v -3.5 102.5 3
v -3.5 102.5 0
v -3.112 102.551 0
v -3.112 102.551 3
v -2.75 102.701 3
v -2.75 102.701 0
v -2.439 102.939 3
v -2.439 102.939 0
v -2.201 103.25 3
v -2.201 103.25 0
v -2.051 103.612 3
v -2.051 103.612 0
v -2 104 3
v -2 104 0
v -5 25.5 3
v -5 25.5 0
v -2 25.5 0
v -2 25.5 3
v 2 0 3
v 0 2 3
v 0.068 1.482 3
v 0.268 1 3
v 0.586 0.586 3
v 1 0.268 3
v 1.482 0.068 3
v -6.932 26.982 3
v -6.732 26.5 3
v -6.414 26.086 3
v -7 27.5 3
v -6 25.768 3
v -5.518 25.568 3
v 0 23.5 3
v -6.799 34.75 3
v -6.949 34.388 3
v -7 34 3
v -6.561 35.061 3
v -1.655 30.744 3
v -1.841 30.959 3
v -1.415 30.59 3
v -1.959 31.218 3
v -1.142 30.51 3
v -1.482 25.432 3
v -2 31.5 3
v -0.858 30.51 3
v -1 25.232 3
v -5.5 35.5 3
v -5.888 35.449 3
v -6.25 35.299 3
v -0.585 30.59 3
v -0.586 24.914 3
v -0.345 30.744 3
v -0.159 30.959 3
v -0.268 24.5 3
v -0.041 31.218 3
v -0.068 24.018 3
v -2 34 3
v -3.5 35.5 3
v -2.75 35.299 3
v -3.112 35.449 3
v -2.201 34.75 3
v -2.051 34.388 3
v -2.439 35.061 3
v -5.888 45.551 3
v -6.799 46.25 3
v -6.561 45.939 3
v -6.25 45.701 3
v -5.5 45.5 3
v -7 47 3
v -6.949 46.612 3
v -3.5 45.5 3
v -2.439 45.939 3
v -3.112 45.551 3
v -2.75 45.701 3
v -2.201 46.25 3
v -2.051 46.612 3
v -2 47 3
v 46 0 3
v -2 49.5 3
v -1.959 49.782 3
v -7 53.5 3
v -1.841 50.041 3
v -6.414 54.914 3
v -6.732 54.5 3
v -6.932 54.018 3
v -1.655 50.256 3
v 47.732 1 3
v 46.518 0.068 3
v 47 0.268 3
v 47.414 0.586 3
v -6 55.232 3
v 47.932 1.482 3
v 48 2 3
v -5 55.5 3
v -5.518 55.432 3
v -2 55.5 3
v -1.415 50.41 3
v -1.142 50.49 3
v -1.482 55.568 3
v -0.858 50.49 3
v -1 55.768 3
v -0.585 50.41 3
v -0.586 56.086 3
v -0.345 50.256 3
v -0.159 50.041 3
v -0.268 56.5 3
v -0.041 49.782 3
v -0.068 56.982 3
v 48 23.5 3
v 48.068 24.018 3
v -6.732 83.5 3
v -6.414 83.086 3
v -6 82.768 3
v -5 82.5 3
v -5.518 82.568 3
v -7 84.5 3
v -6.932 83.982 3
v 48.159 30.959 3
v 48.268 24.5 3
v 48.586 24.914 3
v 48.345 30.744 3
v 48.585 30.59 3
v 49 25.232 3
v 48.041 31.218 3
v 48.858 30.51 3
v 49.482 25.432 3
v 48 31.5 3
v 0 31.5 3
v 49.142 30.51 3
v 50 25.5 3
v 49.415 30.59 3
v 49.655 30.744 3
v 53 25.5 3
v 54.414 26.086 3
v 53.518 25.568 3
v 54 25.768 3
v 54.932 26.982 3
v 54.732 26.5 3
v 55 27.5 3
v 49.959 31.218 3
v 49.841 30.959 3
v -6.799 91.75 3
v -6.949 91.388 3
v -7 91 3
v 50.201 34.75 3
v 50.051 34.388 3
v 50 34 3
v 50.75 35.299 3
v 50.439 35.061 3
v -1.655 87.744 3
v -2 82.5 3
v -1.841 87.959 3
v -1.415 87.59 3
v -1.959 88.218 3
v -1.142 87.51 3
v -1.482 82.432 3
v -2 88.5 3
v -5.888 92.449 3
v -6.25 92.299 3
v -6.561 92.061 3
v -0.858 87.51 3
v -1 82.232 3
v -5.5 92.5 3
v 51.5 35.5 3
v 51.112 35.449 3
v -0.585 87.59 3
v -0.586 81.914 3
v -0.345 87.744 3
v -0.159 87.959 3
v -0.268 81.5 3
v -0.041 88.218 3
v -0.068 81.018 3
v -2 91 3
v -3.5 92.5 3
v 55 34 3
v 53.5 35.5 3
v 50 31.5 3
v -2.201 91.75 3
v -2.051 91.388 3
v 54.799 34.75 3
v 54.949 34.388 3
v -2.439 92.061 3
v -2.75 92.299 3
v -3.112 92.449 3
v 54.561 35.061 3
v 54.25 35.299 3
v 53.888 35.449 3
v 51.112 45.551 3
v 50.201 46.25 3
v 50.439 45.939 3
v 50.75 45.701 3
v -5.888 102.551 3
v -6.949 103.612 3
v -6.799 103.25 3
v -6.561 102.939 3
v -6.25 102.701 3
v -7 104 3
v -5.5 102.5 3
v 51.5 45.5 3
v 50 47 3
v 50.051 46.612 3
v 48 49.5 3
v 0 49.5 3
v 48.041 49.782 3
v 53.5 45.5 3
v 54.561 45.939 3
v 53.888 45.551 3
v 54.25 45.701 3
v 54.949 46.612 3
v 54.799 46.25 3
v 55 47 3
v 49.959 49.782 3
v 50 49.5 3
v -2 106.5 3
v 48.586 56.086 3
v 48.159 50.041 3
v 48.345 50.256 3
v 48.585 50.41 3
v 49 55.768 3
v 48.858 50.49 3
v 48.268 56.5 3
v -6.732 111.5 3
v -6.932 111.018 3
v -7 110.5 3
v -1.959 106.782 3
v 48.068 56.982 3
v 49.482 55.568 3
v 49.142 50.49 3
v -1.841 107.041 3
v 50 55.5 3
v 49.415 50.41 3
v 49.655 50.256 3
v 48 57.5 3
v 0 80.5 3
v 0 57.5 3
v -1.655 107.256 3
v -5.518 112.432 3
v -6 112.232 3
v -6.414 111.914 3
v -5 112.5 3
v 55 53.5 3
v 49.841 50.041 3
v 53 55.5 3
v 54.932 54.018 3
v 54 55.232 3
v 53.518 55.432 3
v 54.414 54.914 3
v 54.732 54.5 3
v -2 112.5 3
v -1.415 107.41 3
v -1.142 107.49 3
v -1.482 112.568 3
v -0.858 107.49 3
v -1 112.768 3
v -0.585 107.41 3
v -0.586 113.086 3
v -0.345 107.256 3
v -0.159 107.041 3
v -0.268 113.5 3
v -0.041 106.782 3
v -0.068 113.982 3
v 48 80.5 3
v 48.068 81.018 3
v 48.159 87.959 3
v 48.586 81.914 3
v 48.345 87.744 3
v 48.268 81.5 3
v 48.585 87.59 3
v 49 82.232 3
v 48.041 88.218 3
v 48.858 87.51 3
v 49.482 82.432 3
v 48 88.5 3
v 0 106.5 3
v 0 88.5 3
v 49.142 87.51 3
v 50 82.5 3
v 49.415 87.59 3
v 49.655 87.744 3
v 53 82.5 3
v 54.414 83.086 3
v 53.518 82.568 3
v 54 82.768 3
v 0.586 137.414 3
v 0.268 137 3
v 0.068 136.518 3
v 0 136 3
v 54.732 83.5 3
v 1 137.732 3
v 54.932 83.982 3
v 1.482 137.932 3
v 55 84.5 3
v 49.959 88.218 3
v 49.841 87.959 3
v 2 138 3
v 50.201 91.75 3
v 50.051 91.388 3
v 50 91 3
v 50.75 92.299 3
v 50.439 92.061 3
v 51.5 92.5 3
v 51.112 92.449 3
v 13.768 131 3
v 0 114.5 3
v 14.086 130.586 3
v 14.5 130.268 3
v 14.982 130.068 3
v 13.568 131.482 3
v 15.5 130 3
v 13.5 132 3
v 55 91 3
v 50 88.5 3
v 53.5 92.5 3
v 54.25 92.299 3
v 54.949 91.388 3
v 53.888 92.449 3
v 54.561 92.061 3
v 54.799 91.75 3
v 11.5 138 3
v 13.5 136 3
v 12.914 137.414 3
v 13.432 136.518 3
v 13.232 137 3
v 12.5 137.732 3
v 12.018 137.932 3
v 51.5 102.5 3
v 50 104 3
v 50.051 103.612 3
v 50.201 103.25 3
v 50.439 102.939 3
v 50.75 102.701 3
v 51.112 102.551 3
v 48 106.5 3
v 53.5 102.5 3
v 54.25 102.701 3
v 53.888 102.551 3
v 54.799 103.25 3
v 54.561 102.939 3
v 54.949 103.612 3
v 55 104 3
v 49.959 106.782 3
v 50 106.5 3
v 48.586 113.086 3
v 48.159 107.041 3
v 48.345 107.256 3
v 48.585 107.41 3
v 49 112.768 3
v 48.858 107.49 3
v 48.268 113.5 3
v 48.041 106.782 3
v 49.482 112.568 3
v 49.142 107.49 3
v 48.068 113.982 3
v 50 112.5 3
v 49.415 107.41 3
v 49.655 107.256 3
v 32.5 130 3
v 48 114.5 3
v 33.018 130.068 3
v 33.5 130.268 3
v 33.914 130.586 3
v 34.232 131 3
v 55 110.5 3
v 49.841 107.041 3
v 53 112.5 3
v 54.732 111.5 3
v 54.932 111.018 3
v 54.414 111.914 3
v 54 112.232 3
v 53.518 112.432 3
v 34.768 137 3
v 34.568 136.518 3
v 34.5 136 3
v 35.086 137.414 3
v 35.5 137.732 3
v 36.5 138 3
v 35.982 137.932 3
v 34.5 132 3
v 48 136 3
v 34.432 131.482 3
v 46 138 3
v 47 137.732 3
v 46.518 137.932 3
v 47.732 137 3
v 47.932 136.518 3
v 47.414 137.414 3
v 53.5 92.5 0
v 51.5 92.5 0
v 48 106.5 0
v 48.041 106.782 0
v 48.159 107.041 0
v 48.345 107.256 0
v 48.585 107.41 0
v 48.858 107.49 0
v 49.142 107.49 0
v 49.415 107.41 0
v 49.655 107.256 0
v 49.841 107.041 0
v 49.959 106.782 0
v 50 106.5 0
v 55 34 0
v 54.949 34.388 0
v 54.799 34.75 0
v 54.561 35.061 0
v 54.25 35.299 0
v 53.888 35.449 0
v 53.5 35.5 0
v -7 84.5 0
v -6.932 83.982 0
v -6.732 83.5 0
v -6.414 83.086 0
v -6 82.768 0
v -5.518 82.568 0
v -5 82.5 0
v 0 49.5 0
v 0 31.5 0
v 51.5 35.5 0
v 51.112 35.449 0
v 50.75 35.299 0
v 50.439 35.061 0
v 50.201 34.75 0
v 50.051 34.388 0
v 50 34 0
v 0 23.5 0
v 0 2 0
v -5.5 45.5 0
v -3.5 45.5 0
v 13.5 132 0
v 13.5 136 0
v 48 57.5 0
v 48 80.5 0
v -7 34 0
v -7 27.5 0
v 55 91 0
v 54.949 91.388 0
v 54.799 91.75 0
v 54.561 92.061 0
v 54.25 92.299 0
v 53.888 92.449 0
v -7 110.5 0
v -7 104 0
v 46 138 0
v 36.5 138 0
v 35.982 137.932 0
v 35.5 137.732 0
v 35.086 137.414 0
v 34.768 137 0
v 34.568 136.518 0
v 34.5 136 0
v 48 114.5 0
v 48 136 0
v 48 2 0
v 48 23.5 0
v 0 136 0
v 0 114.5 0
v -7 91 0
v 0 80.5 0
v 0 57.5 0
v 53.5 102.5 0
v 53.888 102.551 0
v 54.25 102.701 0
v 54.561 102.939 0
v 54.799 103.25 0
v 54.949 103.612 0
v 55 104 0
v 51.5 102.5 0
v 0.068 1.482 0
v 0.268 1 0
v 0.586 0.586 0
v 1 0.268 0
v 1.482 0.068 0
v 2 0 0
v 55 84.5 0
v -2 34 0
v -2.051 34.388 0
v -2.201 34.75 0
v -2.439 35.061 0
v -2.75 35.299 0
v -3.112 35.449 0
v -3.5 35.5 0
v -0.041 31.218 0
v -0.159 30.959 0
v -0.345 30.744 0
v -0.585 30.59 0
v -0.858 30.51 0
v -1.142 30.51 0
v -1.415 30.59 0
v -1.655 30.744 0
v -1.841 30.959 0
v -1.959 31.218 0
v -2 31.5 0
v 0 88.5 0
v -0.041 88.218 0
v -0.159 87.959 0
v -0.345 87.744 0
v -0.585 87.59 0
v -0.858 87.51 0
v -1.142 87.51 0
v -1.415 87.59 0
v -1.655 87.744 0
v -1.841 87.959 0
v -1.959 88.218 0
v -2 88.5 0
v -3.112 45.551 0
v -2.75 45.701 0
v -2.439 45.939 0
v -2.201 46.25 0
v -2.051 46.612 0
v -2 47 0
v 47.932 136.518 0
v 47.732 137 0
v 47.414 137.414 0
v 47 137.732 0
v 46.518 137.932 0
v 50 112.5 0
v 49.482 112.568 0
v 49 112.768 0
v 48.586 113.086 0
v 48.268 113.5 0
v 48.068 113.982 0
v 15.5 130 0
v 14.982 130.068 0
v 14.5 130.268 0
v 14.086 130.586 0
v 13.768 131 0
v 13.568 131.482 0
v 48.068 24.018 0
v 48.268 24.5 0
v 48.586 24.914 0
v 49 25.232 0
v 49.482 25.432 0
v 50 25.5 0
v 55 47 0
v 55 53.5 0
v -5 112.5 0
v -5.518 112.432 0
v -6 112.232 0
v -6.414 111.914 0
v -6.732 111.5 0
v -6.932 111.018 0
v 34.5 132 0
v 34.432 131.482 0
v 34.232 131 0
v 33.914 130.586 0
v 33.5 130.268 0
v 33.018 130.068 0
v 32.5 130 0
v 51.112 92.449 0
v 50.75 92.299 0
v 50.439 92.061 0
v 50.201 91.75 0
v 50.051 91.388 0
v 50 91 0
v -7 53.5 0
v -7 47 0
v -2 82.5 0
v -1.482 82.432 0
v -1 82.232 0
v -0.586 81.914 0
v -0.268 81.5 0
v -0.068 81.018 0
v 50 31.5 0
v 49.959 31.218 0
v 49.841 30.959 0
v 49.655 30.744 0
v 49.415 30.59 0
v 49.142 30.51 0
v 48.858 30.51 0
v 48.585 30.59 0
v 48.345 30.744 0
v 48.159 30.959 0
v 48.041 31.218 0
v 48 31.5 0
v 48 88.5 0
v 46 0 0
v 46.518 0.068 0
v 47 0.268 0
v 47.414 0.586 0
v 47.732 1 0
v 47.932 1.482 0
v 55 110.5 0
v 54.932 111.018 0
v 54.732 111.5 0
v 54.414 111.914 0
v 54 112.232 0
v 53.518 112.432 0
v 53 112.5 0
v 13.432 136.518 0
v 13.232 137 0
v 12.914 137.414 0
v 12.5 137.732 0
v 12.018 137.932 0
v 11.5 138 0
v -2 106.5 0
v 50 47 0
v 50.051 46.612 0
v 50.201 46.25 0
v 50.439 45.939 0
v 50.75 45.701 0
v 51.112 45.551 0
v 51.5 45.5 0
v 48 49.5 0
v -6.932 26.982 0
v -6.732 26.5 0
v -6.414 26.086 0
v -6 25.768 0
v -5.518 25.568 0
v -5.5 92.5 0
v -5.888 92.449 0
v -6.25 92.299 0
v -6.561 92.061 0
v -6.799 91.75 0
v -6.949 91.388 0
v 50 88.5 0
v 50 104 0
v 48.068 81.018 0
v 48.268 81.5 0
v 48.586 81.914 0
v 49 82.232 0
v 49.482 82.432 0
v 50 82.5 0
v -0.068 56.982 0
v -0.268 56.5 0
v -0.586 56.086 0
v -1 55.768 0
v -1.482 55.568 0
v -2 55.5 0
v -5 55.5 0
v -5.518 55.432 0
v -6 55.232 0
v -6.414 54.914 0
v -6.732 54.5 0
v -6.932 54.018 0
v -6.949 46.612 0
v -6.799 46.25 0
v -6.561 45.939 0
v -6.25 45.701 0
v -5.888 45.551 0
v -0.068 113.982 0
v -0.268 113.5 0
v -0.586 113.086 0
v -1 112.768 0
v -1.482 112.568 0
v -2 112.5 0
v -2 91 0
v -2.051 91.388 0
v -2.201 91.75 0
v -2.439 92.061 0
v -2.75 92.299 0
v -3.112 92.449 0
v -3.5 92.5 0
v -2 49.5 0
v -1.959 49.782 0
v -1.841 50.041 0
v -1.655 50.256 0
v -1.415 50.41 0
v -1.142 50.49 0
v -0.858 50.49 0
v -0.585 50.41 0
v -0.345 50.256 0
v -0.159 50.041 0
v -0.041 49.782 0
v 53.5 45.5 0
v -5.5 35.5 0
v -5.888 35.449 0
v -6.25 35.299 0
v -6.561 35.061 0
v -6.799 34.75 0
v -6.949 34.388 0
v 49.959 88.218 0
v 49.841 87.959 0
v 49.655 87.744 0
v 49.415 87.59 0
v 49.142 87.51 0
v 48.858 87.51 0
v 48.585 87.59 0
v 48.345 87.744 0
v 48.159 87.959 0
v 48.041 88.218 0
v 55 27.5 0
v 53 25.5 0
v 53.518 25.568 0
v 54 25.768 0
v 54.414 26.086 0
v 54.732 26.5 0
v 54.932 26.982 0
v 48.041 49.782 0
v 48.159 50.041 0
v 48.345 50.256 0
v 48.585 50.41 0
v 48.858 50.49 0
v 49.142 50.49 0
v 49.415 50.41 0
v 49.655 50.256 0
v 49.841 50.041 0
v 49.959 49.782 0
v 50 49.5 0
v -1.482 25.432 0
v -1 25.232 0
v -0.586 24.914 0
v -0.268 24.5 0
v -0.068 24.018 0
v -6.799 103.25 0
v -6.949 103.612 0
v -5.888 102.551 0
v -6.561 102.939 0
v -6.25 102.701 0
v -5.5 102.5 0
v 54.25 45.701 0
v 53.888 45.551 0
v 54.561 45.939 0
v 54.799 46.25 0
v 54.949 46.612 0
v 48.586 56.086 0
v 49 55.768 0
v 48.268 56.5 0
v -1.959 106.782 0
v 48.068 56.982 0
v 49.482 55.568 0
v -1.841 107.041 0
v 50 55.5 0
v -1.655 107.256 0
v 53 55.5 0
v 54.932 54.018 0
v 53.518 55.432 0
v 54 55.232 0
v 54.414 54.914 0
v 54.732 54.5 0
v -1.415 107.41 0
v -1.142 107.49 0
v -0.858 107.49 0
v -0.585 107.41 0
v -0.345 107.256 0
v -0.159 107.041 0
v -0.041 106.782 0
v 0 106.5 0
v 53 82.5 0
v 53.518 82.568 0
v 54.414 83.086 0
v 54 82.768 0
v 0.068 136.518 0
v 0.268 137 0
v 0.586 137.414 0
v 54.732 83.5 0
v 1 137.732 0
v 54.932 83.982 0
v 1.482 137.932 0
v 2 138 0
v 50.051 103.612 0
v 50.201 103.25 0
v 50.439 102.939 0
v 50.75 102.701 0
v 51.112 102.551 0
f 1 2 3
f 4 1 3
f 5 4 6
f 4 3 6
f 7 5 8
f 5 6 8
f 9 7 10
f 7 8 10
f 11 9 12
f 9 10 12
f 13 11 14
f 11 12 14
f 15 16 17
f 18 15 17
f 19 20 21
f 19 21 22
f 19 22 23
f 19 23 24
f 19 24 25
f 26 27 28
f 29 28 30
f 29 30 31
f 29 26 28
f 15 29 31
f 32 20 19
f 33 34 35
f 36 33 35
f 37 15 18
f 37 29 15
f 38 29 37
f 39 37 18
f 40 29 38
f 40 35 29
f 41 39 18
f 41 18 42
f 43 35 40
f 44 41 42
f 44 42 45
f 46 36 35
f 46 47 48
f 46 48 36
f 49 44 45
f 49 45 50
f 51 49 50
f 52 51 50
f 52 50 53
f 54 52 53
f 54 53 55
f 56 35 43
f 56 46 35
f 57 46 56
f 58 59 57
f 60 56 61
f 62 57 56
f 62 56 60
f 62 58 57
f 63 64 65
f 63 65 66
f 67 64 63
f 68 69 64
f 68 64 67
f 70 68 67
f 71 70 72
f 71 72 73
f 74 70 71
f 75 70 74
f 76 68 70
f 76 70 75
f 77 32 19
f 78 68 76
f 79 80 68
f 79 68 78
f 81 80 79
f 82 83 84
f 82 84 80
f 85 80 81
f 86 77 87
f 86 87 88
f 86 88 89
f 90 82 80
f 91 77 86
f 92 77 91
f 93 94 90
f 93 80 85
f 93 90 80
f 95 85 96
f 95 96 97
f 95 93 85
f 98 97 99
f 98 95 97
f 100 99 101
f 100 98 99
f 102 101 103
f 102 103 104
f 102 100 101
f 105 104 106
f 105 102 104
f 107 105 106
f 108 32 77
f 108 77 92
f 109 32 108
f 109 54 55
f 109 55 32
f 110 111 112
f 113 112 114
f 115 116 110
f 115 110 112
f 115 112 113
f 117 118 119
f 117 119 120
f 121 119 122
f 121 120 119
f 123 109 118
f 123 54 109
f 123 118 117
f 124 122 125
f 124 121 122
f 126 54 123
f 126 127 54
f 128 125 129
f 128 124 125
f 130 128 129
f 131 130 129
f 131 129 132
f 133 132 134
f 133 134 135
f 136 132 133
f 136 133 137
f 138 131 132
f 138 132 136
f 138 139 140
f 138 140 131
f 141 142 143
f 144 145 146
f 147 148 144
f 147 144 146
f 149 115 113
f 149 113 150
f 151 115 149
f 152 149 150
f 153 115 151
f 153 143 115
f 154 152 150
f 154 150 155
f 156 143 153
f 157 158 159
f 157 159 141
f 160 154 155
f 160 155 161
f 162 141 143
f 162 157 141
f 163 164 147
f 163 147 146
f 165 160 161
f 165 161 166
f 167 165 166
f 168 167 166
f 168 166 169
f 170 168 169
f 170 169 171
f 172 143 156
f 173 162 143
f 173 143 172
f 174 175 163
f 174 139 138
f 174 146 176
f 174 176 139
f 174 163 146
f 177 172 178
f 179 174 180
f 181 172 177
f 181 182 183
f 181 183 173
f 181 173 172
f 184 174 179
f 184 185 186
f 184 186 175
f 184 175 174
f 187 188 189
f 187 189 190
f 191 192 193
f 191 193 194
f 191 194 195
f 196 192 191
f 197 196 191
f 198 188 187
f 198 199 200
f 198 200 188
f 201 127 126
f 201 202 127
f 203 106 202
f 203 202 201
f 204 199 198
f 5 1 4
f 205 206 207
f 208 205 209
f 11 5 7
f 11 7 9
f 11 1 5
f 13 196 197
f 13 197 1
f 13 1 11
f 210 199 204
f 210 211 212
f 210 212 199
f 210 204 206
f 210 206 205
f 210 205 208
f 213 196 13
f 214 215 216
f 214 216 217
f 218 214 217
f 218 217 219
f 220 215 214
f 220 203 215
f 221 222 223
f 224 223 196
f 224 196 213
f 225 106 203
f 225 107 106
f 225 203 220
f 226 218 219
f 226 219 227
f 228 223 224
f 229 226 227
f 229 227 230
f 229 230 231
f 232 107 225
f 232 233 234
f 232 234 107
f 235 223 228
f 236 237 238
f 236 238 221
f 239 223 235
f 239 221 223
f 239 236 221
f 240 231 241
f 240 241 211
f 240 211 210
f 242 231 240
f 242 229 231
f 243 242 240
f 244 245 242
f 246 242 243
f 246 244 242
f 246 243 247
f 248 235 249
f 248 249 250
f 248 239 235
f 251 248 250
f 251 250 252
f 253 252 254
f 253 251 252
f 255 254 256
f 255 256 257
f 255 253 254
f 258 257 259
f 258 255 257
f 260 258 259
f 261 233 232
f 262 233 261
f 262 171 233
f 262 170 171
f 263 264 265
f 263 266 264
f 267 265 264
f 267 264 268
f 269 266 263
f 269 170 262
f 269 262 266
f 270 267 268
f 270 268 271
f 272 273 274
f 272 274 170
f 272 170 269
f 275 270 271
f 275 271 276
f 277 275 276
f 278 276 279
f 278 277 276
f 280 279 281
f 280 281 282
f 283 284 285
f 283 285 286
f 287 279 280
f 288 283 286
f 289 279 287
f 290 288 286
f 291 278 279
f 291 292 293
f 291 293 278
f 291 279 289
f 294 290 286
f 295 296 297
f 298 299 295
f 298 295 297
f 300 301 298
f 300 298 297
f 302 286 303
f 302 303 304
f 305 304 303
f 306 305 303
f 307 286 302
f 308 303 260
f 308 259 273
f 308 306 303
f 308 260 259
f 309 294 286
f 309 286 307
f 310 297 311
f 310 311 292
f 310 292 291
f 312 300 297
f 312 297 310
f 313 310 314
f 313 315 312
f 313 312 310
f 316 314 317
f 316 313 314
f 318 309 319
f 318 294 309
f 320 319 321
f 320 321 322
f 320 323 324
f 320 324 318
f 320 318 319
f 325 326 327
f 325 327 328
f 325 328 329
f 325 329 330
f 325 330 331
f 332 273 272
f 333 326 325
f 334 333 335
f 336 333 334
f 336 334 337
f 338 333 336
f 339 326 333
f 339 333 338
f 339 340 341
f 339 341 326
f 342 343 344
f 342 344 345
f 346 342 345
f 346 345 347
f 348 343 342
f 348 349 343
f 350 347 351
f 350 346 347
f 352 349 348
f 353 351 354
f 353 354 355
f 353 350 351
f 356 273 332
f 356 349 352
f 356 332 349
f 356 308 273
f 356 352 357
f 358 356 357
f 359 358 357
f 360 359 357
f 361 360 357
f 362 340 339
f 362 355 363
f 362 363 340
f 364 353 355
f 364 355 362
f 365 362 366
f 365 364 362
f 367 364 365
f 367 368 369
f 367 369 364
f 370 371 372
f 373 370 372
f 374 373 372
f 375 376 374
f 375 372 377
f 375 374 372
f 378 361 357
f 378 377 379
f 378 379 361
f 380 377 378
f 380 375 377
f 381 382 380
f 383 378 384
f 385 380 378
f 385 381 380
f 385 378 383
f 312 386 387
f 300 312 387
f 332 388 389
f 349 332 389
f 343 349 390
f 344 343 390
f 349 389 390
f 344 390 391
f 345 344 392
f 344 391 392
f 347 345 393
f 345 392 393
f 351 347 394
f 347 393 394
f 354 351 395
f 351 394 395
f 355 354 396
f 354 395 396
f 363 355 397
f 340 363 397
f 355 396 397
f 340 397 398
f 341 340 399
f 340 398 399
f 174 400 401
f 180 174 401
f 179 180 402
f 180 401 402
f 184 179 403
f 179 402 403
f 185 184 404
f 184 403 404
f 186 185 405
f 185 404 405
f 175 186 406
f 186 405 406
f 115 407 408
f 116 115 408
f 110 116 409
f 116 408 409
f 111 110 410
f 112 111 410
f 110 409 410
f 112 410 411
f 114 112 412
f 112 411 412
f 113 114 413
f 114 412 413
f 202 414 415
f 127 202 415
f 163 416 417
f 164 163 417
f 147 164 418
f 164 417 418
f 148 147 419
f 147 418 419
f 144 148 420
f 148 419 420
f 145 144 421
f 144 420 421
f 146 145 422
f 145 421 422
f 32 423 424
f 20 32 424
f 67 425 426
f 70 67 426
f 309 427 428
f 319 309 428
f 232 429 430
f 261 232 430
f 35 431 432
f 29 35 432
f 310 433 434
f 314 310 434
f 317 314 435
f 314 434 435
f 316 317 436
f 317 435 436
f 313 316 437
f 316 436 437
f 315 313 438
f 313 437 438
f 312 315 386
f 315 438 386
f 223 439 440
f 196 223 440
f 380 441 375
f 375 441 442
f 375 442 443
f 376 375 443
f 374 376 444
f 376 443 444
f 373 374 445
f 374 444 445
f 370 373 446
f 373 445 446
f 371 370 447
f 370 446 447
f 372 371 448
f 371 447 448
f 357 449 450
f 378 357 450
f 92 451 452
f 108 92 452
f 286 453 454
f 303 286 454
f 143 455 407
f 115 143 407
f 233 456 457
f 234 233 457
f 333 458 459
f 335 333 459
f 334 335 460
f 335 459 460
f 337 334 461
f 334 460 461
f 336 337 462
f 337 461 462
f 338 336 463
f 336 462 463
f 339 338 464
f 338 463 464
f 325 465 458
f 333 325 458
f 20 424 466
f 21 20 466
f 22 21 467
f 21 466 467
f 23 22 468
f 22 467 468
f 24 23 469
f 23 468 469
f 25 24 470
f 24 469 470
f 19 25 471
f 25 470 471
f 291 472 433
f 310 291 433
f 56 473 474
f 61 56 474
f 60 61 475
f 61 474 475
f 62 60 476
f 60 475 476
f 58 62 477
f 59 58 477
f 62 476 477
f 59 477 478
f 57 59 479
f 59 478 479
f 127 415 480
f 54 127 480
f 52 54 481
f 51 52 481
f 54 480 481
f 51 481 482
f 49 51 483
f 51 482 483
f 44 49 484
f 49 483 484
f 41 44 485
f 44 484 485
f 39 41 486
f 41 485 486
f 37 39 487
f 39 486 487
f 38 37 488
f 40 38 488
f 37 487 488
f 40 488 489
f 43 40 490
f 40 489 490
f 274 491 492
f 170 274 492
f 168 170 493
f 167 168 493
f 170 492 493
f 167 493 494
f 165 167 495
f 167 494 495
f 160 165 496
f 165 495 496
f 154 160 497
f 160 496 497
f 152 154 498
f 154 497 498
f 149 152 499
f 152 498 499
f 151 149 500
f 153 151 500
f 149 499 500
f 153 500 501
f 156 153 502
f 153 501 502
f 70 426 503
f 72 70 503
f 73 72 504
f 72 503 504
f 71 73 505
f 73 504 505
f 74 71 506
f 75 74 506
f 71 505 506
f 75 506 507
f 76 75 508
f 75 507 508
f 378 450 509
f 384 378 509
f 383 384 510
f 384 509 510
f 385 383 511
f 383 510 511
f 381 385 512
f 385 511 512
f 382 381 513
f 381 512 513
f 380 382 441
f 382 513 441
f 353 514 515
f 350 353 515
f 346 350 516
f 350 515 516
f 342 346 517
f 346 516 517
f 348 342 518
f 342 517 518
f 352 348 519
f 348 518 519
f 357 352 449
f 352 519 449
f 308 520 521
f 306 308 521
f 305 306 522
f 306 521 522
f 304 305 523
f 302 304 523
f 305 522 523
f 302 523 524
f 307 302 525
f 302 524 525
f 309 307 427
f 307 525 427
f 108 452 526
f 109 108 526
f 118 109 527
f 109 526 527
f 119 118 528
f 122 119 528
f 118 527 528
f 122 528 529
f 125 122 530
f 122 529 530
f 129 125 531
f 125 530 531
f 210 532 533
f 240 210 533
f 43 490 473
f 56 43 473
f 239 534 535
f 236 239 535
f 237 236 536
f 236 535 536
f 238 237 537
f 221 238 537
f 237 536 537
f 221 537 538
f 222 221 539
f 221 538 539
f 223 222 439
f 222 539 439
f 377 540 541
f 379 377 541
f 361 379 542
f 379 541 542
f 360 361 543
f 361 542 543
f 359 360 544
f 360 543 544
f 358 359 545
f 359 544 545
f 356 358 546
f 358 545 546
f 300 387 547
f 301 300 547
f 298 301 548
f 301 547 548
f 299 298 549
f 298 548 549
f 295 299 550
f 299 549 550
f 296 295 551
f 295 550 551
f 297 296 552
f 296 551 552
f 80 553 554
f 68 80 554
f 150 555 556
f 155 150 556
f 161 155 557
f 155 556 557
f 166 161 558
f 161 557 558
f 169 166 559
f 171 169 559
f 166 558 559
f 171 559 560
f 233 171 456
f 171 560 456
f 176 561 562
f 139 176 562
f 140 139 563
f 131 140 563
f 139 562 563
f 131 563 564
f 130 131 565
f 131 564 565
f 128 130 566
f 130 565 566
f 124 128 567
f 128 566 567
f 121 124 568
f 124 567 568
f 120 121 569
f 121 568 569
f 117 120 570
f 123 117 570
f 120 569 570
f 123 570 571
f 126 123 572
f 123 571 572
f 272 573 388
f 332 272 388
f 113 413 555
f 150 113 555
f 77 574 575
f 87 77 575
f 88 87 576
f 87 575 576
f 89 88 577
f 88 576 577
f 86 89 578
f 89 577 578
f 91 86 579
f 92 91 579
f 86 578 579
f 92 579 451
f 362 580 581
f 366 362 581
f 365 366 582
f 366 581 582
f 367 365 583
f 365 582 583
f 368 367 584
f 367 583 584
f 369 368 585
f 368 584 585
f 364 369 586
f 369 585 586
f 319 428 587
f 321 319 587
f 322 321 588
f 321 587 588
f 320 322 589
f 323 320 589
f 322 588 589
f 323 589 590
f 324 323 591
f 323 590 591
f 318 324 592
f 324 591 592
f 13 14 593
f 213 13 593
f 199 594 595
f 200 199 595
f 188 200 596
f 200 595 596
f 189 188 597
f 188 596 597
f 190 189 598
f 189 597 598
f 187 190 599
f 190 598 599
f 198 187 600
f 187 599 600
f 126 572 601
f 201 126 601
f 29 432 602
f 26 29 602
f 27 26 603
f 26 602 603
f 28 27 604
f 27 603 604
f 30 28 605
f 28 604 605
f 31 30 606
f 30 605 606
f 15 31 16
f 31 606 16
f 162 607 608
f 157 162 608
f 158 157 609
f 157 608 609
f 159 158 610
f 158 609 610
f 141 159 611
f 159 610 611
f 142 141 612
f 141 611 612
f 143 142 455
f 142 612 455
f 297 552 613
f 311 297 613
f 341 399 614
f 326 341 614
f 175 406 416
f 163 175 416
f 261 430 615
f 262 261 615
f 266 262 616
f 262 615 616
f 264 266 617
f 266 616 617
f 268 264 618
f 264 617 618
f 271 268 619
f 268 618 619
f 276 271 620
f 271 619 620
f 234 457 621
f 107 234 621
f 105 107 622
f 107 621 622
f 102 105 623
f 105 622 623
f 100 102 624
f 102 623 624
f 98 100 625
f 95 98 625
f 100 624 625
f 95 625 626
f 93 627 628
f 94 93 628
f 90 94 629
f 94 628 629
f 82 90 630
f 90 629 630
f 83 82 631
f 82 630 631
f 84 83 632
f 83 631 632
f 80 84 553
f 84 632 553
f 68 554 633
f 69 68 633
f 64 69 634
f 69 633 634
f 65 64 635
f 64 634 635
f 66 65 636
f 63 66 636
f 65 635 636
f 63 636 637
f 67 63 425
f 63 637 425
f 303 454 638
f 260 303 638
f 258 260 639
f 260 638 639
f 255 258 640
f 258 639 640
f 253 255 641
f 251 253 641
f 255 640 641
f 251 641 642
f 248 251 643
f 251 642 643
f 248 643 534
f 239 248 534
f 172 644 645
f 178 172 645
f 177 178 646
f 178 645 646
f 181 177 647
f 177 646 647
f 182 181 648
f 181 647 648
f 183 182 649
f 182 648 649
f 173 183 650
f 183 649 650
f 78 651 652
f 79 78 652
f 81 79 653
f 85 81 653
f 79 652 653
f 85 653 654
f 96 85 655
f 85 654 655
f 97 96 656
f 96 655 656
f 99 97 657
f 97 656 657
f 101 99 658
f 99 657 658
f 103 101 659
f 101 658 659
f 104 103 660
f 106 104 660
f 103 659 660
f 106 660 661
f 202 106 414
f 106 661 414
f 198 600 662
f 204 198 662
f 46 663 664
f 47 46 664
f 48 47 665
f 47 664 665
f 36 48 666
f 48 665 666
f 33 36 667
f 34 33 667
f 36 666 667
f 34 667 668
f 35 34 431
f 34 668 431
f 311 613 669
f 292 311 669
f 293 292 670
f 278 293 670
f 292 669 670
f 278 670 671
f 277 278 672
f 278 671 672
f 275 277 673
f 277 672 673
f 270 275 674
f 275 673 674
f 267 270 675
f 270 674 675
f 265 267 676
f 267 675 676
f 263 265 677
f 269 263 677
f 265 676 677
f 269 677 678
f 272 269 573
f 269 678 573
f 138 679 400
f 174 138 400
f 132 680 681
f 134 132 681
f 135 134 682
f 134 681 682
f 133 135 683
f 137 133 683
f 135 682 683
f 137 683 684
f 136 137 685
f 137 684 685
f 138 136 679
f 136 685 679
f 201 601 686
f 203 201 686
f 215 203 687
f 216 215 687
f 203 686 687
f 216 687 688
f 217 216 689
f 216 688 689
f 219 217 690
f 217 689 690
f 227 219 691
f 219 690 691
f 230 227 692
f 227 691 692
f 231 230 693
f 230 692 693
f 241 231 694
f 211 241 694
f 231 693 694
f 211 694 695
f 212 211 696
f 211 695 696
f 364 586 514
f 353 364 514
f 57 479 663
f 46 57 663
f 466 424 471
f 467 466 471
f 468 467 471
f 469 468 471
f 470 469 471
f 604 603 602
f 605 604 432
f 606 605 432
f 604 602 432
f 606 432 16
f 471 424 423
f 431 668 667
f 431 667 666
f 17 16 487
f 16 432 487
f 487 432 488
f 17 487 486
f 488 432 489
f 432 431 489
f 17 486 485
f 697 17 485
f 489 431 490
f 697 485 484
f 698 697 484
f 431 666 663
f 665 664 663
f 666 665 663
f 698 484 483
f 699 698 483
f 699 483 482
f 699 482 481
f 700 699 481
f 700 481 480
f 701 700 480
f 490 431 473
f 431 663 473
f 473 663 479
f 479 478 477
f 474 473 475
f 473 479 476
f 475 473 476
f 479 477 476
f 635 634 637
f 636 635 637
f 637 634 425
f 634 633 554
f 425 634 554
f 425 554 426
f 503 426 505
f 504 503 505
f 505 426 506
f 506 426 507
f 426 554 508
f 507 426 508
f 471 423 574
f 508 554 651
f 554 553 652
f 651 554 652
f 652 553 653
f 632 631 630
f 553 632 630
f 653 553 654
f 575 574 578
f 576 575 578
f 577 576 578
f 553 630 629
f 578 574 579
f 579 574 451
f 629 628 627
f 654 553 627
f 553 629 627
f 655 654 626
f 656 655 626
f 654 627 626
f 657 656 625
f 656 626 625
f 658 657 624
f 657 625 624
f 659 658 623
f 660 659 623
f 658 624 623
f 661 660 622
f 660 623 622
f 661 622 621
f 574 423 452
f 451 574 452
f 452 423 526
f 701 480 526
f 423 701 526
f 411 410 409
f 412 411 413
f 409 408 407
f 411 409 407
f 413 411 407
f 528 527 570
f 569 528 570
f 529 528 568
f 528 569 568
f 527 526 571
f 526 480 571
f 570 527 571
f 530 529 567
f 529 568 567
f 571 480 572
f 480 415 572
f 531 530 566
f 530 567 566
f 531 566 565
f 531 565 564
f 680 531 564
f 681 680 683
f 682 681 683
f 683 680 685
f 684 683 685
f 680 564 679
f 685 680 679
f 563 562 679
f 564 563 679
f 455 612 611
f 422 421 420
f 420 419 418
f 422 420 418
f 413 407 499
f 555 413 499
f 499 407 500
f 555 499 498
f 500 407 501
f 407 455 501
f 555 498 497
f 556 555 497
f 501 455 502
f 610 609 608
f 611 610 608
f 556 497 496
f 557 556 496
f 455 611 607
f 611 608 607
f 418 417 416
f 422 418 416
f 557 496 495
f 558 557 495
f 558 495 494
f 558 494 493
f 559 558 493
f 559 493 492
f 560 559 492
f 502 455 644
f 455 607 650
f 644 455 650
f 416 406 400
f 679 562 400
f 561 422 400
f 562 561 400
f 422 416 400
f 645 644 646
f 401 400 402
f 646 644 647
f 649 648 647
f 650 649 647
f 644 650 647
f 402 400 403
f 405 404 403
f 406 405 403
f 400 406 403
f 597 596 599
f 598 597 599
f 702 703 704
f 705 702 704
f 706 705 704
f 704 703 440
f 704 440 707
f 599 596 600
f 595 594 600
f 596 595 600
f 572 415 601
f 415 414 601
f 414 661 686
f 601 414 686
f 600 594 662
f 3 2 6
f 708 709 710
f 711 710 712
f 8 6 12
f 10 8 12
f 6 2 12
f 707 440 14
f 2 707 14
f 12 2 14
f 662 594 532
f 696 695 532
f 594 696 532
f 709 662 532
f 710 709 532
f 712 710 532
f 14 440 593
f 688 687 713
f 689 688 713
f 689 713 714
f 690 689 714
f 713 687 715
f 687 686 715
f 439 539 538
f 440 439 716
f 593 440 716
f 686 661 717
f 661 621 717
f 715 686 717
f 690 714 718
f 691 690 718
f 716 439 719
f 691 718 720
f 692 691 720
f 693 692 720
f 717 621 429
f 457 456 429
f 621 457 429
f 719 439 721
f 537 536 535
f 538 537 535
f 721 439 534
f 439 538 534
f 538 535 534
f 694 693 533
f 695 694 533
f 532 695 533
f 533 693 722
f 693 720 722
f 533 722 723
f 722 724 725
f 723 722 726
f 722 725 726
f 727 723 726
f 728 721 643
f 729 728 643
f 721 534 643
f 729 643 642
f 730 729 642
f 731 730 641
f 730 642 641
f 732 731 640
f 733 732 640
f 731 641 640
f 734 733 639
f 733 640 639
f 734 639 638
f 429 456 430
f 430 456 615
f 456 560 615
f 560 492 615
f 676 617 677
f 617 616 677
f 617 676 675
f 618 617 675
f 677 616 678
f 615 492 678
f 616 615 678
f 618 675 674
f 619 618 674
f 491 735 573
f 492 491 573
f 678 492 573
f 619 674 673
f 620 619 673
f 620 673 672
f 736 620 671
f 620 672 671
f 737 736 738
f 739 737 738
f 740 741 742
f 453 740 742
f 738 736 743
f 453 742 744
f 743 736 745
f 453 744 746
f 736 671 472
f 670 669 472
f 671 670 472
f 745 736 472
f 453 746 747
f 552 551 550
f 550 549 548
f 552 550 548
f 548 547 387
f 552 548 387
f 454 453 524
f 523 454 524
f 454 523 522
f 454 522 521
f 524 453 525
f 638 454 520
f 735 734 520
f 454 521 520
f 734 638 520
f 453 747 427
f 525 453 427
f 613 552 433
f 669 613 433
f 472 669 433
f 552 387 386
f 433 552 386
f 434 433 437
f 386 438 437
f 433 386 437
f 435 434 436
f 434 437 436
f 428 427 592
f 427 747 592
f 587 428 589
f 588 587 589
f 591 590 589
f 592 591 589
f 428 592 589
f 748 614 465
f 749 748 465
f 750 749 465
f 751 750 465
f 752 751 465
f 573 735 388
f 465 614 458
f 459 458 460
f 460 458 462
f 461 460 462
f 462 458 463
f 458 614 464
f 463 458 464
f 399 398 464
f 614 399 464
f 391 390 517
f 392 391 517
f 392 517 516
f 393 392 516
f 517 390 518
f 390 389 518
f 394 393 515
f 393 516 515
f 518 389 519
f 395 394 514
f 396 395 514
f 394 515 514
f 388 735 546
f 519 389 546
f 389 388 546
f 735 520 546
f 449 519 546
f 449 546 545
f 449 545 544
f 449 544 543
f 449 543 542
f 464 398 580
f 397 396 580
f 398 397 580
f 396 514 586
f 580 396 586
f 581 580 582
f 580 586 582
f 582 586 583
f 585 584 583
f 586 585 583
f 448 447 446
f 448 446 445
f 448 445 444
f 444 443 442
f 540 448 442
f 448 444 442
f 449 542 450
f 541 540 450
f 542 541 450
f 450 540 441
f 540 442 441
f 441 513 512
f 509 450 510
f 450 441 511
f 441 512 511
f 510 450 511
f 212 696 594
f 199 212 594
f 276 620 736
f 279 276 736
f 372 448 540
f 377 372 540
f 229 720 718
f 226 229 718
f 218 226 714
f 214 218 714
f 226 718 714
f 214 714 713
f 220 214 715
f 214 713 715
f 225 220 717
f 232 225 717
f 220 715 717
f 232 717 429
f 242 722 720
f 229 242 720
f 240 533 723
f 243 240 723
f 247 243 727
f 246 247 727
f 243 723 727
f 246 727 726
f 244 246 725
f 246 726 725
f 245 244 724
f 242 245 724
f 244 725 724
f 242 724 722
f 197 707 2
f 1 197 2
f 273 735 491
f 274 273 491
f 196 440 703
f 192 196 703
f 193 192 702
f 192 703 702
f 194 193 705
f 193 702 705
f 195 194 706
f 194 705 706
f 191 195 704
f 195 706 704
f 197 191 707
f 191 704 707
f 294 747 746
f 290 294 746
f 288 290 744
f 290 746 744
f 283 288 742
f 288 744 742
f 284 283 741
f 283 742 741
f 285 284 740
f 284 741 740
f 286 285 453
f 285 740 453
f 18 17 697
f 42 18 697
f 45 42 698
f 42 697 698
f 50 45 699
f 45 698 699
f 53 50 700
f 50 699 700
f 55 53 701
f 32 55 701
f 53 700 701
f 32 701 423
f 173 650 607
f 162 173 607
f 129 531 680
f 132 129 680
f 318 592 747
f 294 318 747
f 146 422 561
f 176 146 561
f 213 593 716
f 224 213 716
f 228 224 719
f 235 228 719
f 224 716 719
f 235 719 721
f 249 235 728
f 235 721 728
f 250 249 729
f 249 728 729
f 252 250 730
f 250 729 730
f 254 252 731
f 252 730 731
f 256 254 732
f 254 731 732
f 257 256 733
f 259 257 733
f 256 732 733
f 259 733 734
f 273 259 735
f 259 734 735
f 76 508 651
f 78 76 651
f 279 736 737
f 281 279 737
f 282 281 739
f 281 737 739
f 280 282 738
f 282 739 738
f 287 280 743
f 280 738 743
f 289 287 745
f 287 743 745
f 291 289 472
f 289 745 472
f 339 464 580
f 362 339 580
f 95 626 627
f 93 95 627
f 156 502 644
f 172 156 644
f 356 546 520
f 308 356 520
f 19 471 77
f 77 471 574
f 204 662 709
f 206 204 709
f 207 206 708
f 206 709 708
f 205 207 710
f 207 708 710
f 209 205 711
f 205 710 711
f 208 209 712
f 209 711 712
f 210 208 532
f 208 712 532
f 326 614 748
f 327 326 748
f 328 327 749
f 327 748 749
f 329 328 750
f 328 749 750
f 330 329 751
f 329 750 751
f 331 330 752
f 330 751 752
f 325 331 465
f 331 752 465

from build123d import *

# Parameters (mm, degrees)
F1_DEPTH = 3


with BuildPart() as f1:
    # F0 (on Top) → F1 (new body)
    with BuildSketch(Plane.XY):
        with BuildLine():
            ThreePointArc((0, 2), (0.585786, 0.585786), (2, 0))
            Line((2, 0), (24, 0))
            Line((24, 0), (46, 0))
            ThreePointArc((46, 0), (47.414214, 0.585786), (48, 2))
            Line((48, 2), (48, 23.5))
            ThreePointArc((48, 23.5), (48.585786, 24.914214), (50, 25.5))
            Line((50, 25.5), (53, 25.5))
            ThreePointArc((53, 25.5), (54.414214, 26.085786), (55, 27.5))
            Line((55, 27.5), (55, 34))
            ThreePointArc((55, 34), (54.56066, 35.06066), (53.5, 35.5))
            Line((53.5, 35.5), (51.5, 35.5))
            ThreePointArc((51.5, 35.5), (50.43934, 35.06066), (50, 34))
            Line((50, 34), (50, 31.5))
            ThreePointArc((50, 31.5), (49, 30.5), (48, 31.5))
            Line((48, 31.5), (48, 49.5))
            ThreePointArc((48, 49.5), (49, 50.5), (50, 49.5))
            Line((50, 49.5), (50, 47))
            ThreePointArc((50, 47), (50.43934, 45.93934), (51.5, 45.5))
            Line((51.5, 45.5), (53.5, 45.5))
            ThreePointArc((53.5, 45.5), (54.56066, 45.93934), (55, 47))
            Line((55, 47), (55, 53.5))
            ThreePointArc((55, 53.5), (54.414214, 54.914214), (53, 55.5))
            Line((53, 55.5), (50, 55.5))
            ThreePointArc((50, 55.5), (48.585786, 56.085786), (48, 57.5))
            Line((48, 57.5), (48, 80.5))
            ThreePointArc((48, 80.5), (48.585786, 81.914214), (50, 82.5))
            Line((50, 82.5), (53, 82.5))
            ThreePointArc((53, 82.5), (54.414214, 83.085786), (55, 84.5))
            Line((55, 84.5), (55, 91))
            ThreePointArc((55, 91), (54.56066, 92.06066), (53.5, 92.5))
            Line((53.5, 92.5), (51.5, 92.5))
            ThreePointArc((51.5, 92.5), (50.43934, 92.06066), (50, 91))
            Line((50, 91), (50, 88.5))
            ThreePointArc((50, 88.5), (49, 87.5), (48, 88.5))
            Line((48, 88.5), (48, 106.5))
            ThreePointArc((48, 106.5), (49, 107.5), (50, 106.5))
            Line((50, 106.5), (50, 104))
            ThreePointArc((50, 104), (50.43934, 102.93934), (51.5, 102.5))
            Line((51.5, 102.5), (53.5, 102.5))
            ThreePointArc((53.5, 102.5), (54.56066, 102.93934), (55, 104))
            Line((55, 104), (55, 110.5))
            ThreePointArc((55, 110.5), (54.414214, 111.914214), (53, 112.5))
            Line((53, 112.5), (50, 112.5))
            ThreePointArc((50, 112.5), (48.585786, 113.085786), (48, 114.5))
            Line((48, 114.5), (48, 136))
            ThreePointArc((48, 136), (47.414214, 137.414214), (46, 138))
            Line((46, 138), (36.5, 138))
            ThreePointArc((36.5, 138), (35.085786, 137.414214), (34.5, 136))
            Line((34.5, 136), (34.5, 132))
            ThreePointArc((34.5, 132), (33.914214, 130.585786), (32.5, 130))
            Line((32.5, 130), (24, 130))
            Line((24, 130), (15.5, 130))
            ThreePointArc((15.5, 130), (14.085786, 130.585786), (13.5, 132))
            Line((13.5, 132), (13.5, 136))
            ThreePointArc((13.5, 136), (12.914214, 137.414214), (11.5, 138))
            Line((11.5, 138), (2, 138))
            ThreePointArc((2, 138), (0.585786, 137.414214), (0, 136))
            Line((0, 136), (0, 114.5))
            ThreePointArc((0, 114.5), (-0.585786, 113.085786), (-2, 112.5))
            Line((-2, 112.5), (-5, 112.5))
            ThreePointArc((-5, 112.5), (-6.414214, 111.914214), (-7, 110.5))
            Line((-7, 110.5), (-7, 104))
            ThreePointArc((-7, 104), (-6.56066, 102.93934), (-5.5, 102.5))
            Line((-5.5, 102.5), (-3.5, 102.5))
            ThreePointArc((-3.5, 102.5), (-2.43934, 102.93934), (-2, 104))
            Line((-2, 104), (-2, 106.5))
            ThreePointArc((-2, 106.5), (-1, 107.5), (0, 106.5))
            Line((0, 106.5), (0, 88.5))
            ThreePointArc((0, 88.5), (-1, 87.5), (-2, 88.5))
            Line((-2, 88.5), (-2, 91))
            ThreePointArc((-2, 91), (-2.43934, 92.06066), (-3.5, 92.5))
            Line((-3.5, 92.5), (-5.5, 92.5))
            ThreePointArc((-5.5, 92.5), (-6.56066, 92.06066), (-7, 91))
            Line((-7, 91), (-7, 84.5))
            ThreePointArc((-7, 84.5), (-6.414214, 83.085786), (-5, 82.5))
            Line((-5, 82.5), (-2, 82.5))
            ThreePointArc((-2, 82.5), (-0.585786, 81.914214), (0, 80.5))
            Line((0, 80.5), (0, 57.5))
            ThreePointArc((0, 57.5), (-0.585786, 56.085786), (-2, 55.5))
            Line((-2, 55.5), (-5, 55.5))
            ThreePointArc((-5, 55.5), (-6.414214, 54.914214), (-7, 53.5))
            Line((-7, 53.5), (-7, 47))
            ThreePointArc((-7, 47), (-6.56066, 45.93934), (-5.5, 45.5))
            Line((-5.5, 45.5), (-3.5, 45.5))
            ThreePointArc((-3.5, 45.5), (-2.43934, 45.93934), (-2, 47))
            Line((-2, 47), (-2, 49.5))
            ThreePointArc((-2, 49.5), (-1, 50.5), (0, 49.5))
            Line((0, 49.5), (0, 31.5))
            ThreePointArc((0, 31.5), (-1, 30.5), (-2, 31.5))
            Line((-2, 31.5), (-2, 34))
            ThreePointArc((-2, 34), (-2.43934, 35.06066), (-3.5, 35.5))
            Line((-3.5, 35.5), (-5.5, 35.5))
            ThreePointArc((-5.5, 35.5), (-6.56066, 35.06066), (-7, 34))
            Line((-7, 34), (-7, 27.5))
            ThreePointArc((-7, 27.5), (-6.414214, 26.085786), (-5, 25.5))
            Line((-5, 25.5), (-2, 25.5))
            ThreePointArc((-2, 25.5), (-0.585786, 24.914214), (0, 23.5))
            Line((0, 23.5), (0, 2))
        make_face()
    extrude(amount=F1_DEPTH)


solid = f1.part
